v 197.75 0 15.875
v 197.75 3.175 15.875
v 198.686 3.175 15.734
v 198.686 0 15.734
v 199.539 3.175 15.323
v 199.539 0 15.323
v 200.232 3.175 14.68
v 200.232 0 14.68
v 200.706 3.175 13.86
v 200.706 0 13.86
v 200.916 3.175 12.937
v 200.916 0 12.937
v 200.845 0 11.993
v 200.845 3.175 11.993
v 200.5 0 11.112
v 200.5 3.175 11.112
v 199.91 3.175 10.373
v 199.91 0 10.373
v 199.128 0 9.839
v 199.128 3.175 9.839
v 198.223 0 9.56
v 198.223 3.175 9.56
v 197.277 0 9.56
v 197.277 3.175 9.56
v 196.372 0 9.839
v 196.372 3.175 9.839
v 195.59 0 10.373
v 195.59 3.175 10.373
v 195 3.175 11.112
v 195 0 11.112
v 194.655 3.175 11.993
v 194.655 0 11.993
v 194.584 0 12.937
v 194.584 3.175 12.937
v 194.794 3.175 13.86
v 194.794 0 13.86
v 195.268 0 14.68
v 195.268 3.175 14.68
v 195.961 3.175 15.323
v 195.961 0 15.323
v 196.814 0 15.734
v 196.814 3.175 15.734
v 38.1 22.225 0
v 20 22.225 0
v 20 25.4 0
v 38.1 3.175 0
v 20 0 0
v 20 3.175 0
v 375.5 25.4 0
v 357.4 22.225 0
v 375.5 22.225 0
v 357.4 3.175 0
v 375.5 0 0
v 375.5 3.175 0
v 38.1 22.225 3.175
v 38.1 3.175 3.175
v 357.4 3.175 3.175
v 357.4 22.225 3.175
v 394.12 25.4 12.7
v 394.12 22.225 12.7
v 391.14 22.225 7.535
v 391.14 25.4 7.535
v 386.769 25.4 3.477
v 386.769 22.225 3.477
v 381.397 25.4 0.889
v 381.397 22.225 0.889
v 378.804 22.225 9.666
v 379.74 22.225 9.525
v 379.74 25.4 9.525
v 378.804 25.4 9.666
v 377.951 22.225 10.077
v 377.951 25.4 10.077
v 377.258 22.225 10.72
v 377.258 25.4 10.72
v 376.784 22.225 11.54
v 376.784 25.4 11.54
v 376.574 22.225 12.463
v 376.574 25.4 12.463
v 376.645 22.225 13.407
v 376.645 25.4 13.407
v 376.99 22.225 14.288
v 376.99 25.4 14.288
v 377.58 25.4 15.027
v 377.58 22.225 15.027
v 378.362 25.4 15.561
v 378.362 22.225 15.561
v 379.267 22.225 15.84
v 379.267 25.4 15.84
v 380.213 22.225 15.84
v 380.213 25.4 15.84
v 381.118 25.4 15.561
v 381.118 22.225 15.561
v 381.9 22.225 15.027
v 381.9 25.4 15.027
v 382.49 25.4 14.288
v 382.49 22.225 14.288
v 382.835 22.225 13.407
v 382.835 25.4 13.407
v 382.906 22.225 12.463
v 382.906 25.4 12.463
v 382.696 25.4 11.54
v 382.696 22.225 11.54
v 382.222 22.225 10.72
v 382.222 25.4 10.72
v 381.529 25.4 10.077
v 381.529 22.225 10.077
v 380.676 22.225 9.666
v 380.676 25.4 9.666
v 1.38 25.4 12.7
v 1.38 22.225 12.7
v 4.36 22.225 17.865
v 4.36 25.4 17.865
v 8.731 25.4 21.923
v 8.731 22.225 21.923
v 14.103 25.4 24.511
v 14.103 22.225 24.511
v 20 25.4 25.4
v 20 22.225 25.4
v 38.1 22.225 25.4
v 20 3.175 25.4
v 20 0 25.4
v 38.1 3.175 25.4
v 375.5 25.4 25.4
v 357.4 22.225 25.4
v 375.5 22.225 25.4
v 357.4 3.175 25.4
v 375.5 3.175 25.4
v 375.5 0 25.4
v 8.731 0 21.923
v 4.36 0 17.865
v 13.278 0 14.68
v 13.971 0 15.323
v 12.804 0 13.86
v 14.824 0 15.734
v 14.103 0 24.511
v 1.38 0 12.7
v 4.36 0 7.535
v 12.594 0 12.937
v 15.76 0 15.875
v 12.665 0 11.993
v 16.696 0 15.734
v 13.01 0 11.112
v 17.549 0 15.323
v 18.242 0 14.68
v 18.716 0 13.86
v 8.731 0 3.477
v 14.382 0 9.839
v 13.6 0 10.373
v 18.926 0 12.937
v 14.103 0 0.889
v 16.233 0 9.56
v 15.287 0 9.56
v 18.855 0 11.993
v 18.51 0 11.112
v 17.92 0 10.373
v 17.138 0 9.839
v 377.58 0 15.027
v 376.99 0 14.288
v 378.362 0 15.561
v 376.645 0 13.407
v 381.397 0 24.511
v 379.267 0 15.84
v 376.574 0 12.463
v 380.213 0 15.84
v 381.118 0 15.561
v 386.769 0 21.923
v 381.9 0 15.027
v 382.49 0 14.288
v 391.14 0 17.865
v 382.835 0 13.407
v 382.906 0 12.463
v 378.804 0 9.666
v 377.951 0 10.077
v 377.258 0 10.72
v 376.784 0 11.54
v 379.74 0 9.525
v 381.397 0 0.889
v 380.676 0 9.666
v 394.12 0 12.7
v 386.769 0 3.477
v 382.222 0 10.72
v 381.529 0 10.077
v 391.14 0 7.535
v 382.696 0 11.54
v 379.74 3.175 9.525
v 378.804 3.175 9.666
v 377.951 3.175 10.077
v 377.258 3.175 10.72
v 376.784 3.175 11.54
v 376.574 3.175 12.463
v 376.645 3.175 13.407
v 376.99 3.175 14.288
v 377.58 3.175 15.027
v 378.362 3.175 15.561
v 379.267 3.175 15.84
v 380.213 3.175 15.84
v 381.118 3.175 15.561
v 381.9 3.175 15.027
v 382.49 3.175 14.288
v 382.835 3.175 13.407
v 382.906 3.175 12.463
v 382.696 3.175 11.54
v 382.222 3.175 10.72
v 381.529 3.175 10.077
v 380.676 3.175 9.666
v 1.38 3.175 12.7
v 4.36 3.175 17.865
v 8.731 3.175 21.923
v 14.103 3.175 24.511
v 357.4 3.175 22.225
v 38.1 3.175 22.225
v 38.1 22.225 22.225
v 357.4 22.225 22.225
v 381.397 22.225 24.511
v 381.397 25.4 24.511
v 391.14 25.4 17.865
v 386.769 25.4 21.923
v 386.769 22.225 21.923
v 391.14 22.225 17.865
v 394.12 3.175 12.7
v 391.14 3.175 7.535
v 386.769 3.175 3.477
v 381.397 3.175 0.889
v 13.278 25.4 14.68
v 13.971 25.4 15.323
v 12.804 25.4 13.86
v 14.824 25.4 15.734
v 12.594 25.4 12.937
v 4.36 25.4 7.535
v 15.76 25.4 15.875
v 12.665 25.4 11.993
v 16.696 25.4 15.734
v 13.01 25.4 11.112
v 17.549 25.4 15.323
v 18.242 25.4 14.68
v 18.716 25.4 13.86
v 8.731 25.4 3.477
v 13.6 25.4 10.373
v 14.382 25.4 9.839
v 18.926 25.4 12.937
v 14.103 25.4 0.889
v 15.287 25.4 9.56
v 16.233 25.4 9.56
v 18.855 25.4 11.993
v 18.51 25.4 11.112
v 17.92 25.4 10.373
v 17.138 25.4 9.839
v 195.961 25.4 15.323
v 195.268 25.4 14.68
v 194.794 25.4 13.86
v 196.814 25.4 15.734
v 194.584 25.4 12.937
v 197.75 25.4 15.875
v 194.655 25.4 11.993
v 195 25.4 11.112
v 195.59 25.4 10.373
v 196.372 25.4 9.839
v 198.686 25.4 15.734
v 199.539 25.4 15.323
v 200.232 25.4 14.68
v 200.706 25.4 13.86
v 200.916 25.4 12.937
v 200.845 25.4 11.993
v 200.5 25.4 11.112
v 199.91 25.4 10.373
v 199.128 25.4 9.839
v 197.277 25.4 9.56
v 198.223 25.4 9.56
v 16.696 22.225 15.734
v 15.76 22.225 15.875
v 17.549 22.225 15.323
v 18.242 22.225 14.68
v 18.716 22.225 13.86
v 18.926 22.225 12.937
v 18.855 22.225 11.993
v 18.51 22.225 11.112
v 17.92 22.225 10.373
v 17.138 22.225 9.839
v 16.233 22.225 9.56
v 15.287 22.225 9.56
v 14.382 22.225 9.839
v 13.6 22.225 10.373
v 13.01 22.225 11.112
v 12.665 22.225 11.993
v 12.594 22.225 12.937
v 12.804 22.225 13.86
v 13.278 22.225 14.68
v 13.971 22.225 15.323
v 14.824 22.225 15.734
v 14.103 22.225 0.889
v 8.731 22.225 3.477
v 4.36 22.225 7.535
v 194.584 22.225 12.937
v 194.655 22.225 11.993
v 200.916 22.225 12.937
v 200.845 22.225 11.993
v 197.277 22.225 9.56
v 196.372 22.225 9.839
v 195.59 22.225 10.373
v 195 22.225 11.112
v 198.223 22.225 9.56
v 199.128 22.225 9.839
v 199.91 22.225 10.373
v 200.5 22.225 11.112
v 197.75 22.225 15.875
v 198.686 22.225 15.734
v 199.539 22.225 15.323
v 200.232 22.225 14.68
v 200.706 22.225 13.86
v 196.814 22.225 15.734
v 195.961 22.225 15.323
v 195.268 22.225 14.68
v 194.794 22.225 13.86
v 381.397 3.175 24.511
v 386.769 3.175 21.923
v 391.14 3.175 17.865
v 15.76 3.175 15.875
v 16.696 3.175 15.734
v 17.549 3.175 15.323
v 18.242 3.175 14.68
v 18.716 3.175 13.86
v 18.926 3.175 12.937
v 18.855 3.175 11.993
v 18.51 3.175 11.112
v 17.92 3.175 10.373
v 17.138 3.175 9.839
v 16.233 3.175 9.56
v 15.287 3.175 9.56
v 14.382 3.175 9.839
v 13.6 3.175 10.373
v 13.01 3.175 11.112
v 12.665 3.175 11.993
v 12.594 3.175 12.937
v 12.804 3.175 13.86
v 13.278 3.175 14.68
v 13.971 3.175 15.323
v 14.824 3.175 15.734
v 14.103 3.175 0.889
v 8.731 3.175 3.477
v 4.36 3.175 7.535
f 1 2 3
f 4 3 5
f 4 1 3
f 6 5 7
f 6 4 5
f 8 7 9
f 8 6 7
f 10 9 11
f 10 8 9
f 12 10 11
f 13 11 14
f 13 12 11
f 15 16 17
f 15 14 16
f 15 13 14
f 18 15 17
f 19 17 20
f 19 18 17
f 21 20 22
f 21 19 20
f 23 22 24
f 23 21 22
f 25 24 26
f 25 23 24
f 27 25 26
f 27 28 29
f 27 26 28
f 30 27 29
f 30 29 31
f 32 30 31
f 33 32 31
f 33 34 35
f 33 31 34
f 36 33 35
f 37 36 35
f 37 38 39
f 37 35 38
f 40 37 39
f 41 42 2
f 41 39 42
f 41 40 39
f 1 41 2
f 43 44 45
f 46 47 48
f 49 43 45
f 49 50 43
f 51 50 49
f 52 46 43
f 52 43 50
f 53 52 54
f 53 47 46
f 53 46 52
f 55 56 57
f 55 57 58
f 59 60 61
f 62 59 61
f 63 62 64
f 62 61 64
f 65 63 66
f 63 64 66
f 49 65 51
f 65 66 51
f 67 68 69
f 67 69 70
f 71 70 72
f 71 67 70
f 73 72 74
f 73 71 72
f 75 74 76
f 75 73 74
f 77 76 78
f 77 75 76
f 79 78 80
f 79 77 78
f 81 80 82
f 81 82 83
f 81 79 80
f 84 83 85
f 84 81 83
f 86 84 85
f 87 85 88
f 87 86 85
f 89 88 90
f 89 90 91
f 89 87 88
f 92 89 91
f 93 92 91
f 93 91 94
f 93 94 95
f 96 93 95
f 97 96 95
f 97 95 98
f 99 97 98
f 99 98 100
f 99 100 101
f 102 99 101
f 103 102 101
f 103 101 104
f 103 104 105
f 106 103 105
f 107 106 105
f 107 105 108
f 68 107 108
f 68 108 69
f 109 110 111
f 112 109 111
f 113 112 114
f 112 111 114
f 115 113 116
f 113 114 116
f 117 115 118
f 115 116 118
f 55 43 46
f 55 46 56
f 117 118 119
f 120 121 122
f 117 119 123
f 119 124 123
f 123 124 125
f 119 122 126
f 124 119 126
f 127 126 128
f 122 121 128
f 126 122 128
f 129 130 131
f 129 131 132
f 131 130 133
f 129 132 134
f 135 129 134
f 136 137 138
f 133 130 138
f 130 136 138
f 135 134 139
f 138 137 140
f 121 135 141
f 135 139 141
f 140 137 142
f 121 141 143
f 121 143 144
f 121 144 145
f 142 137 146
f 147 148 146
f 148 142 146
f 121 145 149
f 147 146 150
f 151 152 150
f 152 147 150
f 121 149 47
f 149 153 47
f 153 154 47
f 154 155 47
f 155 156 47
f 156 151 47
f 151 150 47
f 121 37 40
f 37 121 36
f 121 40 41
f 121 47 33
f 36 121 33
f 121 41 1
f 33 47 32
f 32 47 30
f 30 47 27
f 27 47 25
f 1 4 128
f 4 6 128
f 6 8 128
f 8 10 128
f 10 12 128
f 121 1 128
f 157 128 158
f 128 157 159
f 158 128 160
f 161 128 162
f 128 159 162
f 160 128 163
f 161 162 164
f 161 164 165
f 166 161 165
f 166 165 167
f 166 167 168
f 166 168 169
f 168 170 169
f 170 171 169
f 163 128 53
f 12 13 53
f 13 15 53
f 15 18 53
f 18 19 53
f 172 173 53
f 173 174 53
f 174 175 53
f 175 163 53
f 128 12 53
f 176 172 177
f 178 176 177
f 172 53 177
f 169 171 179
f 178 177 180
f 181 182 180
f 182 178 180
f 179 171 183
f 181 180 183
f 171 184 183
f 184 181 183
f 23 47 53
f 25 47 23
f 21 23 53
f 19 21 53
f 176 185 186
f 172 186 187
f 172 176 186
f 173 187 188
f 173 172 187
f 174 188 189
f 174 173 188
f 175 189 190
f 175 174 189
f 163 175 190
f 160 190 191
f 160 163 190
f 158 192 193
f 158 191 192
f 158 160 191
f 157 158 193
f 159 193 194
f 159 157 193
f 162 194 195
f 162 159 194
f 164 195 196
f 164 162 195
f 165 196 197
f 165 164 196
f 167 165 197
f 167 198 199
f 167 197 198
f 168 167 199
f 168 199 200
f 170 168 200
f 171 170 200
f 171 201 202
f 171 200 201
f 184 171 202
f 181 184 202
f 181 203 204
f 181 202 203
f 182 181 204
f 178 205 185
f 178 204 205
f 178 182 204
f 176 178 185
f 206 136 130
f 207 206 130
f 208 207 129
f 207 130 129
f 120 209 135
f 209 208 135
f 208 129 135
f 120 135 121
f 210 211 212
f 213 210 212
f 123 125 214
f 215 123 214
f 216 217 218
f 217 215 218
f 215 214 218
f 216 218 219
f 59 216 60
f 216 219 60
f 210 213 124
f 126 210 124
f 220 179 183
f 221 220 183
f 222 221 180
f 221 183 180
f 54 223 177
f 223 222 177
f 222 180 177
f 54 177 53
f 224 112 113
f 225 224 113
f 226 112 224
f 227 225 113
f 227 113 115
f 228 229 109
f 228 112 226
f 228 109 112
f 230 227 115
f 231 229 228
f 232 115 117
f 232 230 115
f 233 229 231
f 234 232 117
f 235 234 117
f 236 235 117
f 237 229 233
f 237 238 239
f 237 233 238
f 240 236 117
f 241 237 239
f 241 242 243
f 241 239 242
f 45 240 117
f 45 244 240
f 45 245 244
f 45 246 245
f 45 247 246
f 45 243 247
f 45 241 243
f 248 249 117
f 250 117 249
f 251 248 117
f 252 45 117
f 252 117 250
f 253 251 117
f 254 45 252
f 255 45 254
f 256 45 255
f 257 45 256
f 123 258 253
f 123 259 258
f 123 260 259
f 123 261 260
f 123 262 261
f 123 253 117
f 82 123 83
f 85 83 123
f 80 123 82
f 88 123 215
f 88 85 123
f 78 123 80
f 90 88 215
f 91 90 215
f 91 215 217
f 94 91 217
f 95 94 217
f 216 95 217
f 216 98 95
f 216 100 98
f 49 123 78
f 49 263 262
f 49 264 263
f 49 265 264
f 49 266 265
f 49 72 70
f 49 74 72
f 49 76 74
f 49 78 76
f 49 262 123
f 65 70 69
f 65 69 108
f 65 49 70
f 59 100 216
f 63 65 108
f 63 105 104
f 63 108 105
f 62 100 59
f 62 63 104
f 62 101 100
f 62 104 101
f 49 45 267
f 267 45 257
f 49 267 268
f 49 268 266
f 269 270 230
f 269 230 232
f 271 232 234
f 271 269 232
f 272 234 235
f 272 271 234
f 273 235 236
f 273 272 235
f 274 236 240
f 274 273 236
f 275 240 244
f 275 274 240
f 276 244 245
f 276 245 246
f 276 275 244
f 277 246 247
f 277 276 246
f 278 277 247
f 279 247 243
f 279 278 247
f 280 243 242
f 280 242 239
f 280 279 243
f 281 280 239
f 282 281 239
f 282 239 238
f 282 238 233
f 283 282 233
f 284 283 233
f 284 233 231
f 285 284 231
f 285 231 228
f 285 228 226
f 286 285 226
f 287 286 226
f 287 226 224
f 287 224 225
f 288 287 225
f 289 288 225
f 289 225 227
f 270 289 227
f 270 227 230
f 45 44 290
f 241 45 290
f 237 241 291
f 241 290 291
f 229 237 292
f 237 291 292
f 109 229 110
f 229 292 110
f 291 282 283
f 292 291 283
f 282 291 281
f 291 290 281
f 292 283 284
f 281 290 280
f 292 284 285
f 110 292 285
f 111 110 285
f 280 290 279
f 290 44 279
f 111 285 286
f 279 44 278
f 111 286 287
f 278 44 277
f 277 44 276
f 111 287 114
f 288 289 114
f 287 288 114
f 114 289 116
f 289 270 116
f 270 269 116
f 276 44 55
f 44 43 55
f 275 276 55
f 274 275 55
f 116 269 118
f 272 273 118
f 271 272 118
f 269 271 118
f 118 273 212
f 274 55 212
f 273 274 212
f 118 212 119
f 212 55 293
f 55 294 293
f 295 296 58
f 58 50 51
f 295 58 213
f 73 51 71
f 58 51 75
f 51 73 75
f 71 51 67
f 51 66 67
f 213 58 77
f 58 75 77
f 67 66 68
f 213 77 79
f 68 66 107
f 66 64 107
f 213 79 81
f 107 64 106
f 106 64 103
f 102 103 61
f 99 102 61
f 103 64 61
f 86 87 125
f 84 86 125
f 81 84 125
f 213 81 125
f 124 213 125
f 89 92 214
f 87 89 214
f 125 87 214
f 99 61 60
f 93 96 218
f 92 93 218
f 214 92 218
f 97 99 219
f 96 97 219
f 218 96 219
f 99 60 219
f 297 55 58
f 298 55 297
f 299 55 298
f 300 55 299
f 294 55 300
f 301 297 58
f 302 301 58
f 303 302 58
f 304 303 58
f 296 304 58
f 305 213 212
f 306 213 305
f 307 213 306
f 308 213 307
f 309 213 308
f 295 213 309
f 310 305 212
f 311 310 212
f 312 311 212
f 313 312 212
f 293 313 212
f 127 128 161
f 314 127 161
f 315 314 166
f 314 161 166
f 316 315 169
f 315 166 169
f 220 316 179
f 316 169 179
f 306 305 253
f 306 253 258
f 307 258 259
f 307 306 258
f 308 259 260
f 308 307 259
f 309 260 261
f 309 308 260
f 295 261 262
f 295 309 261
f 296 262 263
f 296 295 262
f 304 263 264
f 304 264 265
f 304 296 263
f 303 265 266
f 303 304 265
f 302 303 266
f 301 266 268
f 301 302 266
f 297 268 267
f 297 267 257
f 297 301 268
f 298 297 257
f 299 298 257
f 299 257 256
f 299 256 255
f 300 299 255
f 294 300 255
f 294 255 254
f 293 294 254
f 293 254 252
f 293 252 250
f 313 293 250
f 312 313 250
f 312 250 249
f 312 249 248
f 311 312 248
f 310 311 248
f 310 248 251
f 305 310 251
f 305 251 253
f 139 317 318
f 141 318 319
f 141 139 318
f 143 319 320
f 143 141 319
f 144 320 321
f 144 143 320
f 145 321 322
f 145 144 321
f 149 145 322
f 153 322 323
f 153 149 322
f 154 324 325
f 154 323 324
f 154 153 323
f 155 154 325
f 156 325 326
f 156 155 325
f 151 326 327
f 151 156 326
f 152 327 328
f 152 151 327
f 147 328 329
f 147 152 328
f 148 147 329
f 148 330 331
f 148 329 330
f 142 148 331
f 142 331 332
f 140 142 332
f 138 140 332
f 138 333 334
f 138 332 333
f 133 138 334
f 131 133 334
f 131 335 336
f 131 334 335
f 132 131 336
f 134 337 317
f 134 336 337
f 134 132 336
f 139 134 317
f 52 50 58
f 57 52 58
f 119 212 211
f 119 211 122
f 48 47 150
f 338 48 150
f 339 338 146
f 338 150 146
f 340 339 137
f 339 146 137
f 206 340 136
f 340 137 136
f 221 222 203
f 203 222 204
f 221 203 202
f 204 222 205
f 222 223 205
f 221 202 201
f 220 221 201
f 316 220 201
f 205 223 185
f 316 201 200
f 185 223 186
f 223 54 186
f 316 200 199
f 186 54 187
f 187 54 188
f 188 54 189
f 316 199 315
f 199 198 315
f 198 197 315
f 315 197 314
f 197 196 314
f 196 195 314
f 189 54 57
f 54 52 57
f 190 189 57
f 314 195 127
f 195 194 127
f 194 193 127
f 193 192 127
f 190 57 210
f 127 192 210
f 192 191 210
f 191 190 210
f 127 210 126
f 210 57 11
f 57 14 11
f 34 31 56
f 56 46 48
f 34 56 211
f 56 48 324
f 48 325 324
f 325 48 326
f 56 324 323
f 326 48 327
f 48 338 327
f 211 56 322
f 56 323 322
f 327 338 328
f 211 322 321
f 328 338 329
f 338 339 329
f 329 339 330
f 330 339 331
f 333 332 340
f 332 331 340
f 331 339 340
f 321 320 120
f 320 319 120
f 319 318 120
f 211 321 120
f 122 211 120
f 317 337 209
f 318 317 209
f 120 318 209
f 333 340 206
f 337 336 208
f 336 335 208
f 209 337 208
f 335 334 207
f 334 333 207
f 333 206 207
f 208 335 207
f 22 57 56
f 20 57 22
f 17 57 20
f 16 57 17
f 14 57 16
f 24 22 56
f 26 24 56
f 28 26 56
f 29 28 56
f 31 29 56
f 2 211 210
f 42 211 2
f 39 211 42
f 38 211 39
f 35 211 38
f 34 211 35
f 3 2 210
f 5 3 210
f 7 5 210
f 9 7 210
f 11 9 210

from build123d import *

# Parameters (mm, degrees)
SKETCH1_W           = 395.5
SKETCH1_H           = 25.4
SKETCH1_R           = 3.175
BOSS_EXTRUDE1_DEPTH = 25.4
CUT_EXTRUDE1_REACH  = 399.128
SKETCH2_W           = 19.05
SKETCH2_H           = 19.05
SKETCH4_W           = 25.4
SKETCH4_H           = 19.05
CUT_EXTRUDE2_DEPTH  = 38.1
FILLET1_R           = 20


with BuildPart() as part:
    # Sketch1 → Boss-Extrude1 (new body)
    with BuildSketch(Plane(origin=(0, 0, 0), x_dir=(1, 0, 0), z_dir=(0, 1, 0))):
        with Locations((197.75, -12.7)):
            Rectangle(SKETCH1_W, SKETCH1_H)
        with Locations(Location((197.75, -12.7, 0), (0, 0, 270))):
            Circle(SKETCH1_R, mode=Mode.SUBTRACT)
        with Locations(Location((15.76, -12.7, 0), (0, 0, 270))):
            Circle(SKETCH1_R, mode=Mode.SUBTRACT)
        with Locations(Location((379.74, -12.7, 0), (0, 0, 90))):
            Circle(SKETCH1_R, mode=Mode.SUBTRACT)
    extrude(amount=BOSS_EXTRUDE1_DEPTH)

    # Cut-Extrude1: up to this face of the body (flat: up to its plane)
    cut_extrude1_end = Plane(part.part.faces().sort_by_distance((395.5, 12.7, 12.7))[0])
    # Sketch2 → Cut-Extrude1 (cut, up to the picked face)
    with BuildSketch(Plane.ZY, mode=Mode.PRIVATE) as cut_extrude1_sk1:
        with Locations((12.7, 12.7)):
            Rectangle(SKETCH2_W, SKETCH2_H)
    cut_extrude1_tool1 = split(extrude(cut_extrude1_sk1.sketch, amount=-CUT_EXTRUDE1_REACH, mode=Mode.PRIVATE), bisect_by=cut_extrude1_end, keep=Keep.BOTH, mode=Mode.PRIVATE)
    add(cut_extrude1_tool1.solids().sort_by(Axis((0, 12.7, 12.7), (1, 0, 0)))[0], mode=Mode.SUBTRACT)

    # Sketch4 → Cut-Extrude2 (cut)
    with BuildSketch(Plane.ZY):
        with Locations((12.7, 12.7)):
            Rectangle(SKETCH4_W, SKETCH4_H)
    cut_extrude2 = extrude(amount=-CUT_EXTRUDE2_DEPTH, mode=Mode.SUBTRACT)

    # Mirror1: Cut-Extrude2 across plane
    add(cut_extrude2.mirror(Plane.ZY.offset(-197.75)), mode=Mode.SUBTRACT)

    # Fillet1
    # the kernel refuses this fillet: 20 mm, written as the material it takes off along each edge
    with BuildSketch(Plane(origin=(395.5, -50, 0), x_dir=(-1, 0, 0), z_dir=(0, 1, 0)), Plane(origin=(395.5, -27.775, 0), x_dir=(-1, 0, 0), z_dir=(0, 1, 0)), Plane(origin=(0, -27.775, 25.4), x_dir=(1, 0, 0), z_dir=(0, 1, 0))) as fillet1_piece_1:
        with BuildLine():
            CenterArc((FILLET1_R, FILLET1_R), FILLET1_R, 180, 90)
            Line((0, FILLET1_R), (0, 0))
            Line((0, 0), (FILLET1_R, 0))
        make_face()
    extrude(amount=103.175, mode=Mode.SUBTRACT)
    with BuildSketch(Plane(origin=(395.5, -50, 25.4), x_dir=(-1, 0, 0), z_dir=(0, 1, 0)), Plane(origin=(395.5, -27.775, 25.4), x_dir=(-1, 0, 0), z_dir=(0, 1, 0)), Plane(origin=(0, -50, 25.4), x_dir=(0, 0, -1), z_dir=(0, 1, 0)), Plane(origin=(0, -50, 0), x_dir=(1, 0, 0), z_dir=(0, 1, 0)), Plane(origin=(0, -27.775, 0), x_dir=(1, 0, 0), z_dir=(0, 1, 0))) as fillet1_piece_2:
        with BuildLine():
            CenterArc((FILLET1_R, -FILLET1_R), FILLET1_R, 90, 90)
            Line((0, -FILLET1_R), (0, 0))
            Line((0, 0), (FILLET1_R, 0))
        make_face()
    extrude(amount=103.175, mode=Mode.SUBTRACT)


solid = part.part
